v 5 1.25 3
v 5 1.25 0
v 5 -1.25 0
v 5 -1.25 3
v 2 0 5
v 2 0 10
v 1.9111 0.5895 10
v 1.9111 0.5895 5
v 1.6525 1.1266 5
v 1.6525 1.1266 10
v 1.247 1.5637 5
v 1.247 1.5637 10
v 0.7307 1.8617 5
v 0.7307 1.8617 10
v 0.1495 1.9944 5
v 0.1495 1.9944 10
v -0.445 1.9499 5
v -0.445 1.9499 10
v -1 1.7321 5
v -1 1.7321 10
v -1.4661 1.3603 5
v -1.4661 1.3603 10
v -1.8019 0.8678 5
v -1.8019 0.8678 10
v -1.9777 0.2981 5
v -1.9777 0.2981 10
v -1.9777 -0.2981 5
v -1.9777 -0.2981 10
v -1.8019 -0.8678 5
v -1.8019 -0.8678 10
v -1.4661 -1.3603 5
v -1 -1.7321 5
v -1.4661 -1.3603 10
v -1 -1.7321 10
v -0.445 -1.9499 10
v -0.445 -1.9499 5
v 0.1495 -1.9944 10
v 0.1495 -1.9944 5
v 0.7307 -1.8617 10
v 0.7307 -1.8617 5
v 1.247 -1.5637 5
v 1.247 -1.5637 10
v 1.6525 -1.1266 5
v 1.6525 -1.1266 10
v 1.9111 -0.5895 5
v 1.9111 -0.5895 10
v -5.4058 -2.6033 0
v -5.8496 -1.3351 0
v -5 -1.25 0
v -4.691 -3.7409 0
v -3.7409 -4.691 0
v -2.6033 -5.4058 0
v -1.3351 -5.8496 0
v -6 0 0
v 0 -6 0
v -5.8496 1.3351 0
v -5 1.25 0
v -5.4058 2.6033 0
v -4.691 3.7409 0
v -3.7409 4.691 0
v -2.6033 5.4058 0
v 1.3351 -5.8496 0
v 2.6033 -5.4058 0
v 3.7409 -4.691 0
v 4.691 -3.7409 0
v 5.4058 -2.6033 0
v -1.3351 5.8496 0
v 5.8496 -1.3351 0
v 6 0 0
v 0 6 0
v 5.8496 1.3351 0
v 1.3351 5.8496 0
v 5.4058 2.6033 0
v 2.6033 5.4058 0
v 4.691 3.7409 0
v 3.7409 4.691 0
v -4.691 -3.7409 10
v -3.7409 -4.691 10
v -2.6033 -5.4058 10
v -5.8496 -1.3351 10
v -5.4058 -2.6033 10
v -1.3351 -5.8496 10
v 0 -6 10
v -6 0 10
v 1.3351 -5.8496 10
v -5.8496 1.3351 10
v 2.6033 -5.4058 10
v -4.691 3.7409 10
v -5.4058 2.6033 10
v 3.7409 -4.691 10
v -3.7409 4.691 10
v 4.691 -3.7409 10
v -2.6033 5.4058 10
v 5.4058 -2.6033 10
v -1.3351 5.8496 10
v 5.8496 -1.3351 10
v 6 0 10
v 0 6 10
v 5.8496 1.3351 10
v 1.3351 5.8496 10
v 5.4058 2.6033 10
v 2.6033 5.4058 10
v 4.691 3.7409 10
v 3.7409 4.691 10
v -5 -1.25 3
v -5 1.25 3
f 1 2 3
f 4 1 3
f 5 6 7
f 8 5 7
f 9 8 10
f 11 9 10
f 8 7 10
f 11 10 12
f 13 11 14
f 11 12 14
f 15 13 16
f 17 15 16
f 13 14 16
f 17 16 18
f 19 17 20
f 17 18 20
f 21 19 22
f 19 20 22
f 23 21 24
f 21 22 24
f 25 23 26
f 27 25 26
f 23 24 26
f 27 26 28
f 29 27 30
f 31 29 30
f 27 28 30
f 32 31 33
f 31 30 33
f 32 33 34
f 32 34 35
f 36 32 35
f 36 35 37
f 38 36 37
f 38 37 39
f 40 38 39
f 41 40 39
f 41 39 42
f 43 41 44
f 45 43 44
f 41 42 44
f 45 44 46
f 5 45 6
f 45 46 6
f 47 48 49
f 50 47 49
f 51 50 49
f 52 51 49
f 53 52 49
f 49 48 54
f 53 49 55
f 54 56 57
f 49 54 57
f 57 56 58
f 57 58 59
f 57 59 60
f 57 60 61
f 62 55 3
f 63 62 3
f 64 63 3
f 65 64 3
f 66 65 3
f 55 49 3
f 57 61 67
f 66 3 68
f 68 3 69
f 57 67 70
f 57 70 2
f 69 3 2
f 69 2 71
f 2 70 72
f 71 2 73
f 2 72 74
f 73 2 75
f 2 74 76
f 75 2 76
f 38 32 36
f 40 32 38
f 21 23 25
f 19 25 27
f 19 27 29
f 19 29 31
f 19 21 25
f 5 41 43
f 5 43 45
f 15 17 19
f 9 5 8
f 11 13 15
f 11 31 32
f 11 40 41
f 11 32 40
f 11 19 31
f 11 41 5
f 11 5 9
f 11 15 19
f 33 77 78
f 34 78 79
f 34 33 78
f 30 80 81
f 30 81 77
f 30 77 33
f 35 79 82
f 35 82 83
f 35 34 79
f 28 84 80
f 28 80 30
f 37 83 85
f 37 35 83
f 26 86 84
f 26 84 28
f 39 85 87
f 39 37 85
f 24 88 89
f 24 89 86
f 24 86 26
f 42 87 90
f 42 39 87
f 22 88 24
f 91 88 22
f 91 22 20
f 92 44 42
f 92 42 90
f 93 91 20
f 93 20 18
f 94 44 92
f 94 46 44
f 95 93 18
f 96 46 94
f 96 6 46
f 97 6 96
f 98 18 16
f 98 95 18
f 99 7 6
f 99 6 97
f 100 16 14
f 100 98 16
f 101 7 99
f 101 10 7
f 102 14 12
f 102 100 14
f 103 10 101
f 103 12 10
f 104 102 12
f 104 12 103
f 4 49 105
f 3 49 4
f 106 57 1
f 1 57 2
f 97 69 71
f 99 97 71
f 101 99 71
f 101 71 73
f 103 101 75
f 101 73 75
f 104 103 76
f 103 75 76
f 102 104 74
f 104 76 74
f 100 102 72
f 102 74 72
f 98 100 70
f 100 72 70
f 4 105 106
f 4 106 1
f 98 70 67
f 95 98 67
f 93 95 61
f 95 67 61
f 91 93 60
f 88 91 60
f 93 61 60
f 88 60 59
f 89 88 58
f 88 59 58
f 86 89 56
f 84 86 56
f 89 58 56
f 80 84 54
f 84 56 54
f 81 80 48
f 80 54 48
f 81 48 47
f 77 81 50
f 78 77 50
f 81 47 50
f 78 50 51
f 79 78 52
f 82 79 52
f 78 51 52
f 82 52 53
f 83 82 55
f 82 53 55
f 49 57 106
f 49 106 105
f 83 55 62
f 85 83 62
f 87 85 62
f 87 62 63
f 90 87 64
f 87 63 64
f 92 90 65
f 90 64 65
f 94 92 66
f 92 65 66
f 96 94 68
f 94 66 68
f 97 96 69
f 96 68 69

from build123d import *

# Parameters (mm, degrees)
F1_DEPTH = 10
F2_R     = 2
F3_DEPTH = 5
F4_W     = 10
F4_H     = 2.5
F5_DEPTH = 3


with BuildPart() as f1:
    # F0 (on Top) → F1 (new body)
    with BuildSketch(Plane.XY):
        with BuildLine():
            ThreePointArc((0, -6), (4.242641, -4.242641), (6, 0))
            ThreePointArc((6, 0), (4.242641, 4.242641), (0, 6))
            Line((0, 6), (0, -6))
        make_face()
        with BuildLine():
            Line((0, -6), (0, 6))
            ThreePointArc((0, 6), (-6, 0), (0, -6))
        make_face()
    extrude(amount=F1_DEPTH)

    # F2 (on face) → F3 (cut)
    with BuildSketch(Plane.XY.offset(10)):
        Circle(F2_R)
    extrude(amount=-F3_DEPTH, mode=Mode.SUBTRACT)

    # F4 (on face) → F5 (cut)
    with BuildSketch(Plane(origin=(0, 0, 0), x_dir=(1, 0, 0), z_dir=(0, 0, -1))):
        Rectangle(F4_W, F4_H)
    extrude(amount=-F5_DEPTH, mode=Mode.SUBTRACT)


solid = f1.part
